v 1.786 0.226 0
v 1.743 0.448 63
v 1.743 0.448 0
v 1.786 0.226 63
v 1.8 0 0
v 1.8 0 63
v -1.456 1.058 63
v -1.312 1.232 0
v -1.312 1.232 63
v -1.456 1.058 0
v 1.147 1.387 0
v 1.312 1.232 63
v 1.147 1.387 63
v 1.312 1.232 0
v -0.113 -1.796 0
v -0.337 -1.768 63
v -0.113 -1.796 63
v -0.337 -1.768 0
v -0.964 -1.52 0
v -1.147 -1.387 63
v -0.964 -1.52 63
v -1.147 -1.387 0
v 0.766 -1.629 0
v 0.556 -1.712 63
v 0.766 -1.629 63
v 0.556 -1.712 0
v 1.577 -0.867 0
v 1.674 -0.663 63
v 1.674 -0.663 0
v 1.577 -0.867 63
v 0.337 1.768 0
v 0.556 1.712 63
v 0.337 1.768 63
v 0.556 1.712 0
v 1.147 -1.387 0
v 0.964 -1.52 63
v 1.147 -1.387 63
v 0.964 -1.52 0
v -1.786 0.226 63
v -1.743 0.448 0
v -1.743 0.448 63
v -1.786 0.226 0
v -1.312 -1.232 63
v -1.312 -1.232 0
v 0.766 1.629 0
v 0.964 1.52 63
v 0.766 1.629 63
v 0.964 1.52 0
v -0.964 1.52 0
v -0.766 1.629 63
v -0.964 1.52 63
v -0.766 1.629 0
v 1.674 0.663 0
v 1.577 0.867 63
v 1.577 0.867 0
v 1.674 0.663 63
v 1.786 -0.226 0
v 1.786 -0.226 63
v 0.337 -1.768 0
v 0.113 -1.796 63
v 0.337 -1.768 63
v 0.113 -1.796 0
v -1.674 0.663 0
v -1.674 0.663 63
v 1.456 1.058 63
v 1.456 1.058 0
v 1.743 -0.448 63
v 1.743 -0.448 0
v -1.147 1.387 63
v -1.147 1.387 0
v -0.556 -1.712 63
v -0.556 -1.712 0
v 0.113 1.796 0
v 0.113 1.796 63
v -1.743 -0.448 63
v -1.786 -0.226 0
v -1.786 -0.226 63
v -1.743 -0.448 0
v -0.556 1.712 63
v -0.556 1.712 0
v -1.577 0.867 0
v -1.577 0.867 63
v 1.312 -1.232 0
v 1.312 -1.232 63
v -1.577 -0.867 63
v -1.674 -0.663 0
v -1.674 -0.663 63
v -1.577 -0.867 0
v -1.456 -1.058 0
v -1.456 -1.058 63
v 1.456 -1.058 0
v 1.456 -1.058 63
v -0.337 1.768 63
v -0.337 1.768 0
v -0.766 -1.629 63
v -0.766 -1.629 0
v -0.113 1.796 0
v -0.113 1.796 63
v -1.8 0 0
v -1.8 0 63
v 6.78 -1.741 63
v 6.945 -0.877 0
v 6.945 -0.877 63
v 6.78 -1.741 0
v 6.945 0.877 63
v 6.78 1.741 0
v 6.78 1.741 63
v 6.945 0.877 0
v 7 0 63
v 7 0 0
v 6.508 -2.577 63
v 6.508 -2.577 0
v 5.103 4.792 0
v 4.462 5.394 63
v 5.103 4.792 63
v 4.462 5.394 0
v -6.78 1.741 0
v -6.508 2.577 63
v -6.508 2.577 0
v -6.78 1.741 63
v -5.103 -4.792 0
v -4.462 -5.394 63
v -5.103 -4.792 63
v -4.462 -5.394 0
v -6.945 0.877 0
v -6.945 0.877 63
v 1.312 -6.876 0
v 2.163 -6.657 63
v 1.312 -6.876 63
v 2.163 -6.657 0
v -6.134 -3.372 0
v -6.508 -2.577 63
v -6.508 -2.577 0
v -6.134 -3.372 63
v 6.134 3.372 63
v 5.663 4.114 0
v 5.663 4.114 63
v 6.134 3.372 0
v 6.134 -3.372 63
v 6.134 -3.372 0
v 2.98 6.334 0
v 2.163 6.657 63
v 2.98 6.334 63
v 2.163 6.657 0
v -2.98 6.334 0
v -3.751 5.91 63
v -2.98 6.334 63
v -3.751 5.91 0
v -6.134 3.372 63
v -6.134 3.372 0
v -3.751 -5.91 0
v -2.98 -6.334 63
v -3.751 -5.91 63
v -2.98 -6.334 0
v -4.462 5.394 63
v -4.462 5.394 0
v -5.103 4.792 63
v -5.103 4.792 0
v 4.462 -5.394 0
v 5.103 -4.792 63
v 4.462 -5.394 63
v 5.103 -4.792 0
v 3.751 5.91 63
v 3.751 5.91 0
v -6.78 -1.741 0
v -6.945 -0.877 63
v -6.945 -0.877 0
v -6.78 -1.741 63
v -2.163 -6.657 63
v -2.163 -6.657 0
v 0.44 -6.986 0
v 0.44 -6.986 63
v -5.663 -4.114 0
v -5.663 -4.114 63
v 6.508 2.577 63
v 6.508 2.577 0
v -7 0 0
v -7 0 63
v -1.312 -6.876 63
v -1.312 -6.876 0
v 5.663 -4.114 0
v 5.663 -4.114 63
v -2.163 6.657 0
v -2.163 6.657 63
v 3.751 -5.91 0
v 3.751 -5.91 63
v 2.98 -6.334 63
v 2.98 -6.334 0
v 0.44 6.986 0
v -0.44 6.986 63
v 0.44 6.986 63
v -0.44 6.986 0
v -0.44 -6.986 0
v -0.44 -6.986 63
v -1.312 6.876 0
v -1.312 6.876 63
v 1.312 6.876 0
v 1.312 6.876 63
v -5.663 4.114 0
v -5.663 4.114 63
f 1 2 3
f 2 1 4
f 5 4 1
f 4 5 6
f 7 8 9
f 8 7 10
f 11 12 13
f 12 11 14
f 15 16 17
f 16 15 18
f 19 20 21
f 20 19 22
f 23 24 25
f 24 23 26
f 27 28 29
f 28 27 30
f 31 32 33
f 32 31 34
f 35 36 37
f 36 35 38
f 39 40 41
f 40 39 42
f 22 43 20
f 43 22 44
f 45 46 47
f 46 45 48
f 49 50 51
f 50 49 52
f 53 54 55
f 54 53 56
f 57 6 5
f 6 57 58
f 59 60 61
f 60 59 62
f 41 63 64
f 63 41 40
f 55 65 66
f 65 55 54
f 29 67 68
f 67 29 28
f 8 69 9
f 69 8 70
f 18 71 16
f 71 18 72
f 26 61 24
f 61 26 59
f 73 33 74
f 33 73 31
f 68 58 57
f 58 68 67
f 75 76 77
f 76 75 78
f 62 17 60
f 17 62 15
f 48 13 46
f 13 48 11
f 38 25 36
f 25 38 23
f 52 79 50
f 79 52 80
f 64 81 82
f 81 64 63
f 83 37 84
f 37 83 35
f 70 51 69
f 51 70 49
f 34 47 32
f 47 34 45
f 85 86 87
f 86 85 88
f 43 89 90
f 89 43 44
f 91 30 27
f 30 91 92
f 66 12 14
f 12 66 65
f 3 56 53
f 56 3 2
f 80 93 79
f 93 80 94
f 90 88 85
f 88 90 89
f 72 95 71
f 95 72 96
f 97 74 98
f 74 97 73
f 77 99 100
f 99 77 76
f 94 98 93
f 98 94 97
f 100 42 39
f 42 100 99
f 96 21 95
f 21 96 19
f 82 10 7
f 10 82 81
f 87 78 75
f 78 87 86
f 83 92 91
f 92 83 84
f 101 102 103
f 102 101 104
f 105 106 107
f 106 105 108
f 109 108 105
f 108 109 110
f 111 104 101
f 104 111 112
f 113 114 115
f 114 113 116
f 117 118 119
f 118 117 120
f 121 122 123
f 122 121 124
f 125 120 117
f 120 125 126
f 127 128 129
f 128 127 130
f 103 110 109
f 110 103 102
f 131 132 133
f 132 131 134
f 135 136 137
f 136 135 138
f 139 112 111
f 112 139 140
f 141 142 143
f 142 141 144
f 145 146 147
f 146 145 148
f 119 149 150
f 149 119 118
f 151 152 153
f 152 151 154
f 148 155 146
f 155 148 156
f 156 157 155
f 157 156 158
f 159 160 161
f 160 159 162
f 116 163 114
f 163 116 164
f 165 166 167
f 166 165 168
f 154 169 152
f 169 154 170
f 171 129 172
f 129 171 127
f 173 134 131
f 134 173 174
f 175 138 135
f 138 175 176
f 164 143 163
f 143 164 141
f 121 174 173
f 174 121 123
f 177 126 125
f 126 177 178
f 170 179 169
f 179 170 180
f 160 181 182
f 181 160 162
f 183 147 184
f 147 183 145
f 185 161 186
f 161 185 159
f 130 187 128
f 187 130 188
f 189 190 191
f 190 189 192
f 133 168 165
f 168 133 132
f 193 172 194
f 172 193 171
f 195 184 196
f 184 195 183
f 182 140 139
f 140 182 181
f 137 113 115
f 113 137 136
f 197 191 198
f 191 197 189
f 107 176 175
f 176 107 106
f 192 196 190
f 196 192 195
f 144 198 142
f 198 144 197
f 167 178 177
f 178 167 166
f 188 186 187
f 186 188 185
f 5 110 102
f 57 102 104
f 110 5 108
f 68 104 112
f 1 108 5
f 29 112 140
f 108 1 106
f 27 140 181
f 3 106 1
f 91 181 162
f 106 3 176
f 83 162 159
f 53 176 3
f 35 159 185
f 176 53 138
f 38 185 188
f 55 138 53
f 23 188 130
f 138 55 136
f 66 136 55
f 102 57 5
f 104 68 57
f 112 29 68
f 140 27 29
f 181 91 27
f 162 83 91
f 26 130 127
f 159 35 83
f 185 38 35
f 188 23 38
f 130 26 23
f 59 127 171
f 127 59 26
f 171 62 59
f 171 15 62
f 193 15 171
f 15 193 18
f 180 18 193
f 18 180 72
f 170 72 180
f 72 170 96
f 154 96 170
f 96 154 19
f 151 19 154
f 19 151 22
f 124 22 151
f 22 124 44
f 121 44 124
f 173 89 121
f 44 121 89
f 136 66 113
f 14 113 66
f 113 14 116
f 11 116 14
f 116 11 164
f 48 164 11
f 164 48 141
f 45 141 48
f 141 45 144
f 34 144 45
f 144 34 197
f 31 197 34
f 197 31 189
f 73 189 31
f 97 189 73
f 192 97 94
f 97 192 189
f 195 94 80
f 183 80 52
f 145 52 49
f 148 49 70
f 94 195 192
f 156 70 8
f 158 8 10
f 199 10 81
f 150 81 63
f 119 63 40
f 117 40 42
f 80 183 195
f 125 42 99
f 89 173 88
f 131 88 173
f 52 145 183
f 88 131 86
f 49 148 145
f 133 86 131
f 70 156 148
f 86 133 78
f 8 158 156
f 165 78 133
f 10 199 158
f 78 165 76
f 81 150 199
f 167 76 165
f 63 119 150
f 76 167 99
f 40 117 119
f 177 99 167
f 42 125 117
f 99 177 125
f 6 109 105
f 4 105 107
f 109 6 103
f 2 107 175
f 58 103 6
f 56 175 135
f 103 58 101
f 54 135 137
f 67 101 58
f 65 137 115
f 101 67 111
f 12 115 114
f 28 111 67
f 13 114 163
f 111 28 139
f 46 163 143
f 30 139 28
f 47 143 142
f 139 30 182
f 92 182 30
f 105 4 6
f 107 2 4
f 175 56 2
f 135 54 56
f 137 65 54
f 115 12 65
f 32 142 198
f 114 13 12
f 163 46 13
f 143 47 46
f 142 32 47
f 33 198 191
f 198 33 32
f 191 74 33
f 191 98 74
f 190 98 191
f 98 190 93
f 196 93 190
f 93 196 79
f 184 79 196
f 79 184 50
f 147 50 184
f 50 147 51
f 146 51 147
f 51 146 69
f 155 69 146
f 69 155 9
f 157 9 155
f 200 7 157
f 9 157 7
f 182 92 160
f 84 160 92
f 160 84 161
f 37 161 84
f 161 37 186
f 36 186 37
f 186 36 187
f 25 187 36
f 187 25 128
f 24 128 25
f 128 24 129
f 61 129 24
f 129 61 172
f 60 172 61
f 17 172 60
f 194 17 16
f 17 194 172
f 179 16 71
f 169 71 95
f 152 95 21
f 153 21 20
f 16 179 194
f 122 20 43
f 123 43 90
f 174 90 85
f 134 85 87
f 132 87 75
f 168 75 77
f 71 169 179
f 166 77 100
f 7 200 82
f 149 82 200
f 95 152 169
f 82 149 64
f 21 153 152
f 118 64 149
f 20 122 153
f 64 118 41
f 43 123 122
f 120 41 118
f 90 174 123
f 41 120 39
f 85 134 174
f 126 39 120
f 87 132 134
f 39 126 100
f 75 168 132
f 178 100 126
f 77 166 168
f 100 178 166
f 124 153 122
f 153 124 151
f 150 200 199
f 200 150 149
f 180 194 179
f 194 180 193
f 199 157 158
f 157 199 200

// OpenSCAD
$fn = 50;


difference() {
	union() {
		cylinder(h = 63, r = 7.0000000000);
	}
	union() {
		translate(v = [0.0000000000, 0.0000000000, -100.0000000000]) {
			cylinder(h = 200, r = 1.8000000000);
		}
		cylinder(h = 63, r = 1.8000000000);
		cylinder(h = 63, r = 1.8000000000);
		cylinder(h = 63, r = 1.8000000000);
	}
}
